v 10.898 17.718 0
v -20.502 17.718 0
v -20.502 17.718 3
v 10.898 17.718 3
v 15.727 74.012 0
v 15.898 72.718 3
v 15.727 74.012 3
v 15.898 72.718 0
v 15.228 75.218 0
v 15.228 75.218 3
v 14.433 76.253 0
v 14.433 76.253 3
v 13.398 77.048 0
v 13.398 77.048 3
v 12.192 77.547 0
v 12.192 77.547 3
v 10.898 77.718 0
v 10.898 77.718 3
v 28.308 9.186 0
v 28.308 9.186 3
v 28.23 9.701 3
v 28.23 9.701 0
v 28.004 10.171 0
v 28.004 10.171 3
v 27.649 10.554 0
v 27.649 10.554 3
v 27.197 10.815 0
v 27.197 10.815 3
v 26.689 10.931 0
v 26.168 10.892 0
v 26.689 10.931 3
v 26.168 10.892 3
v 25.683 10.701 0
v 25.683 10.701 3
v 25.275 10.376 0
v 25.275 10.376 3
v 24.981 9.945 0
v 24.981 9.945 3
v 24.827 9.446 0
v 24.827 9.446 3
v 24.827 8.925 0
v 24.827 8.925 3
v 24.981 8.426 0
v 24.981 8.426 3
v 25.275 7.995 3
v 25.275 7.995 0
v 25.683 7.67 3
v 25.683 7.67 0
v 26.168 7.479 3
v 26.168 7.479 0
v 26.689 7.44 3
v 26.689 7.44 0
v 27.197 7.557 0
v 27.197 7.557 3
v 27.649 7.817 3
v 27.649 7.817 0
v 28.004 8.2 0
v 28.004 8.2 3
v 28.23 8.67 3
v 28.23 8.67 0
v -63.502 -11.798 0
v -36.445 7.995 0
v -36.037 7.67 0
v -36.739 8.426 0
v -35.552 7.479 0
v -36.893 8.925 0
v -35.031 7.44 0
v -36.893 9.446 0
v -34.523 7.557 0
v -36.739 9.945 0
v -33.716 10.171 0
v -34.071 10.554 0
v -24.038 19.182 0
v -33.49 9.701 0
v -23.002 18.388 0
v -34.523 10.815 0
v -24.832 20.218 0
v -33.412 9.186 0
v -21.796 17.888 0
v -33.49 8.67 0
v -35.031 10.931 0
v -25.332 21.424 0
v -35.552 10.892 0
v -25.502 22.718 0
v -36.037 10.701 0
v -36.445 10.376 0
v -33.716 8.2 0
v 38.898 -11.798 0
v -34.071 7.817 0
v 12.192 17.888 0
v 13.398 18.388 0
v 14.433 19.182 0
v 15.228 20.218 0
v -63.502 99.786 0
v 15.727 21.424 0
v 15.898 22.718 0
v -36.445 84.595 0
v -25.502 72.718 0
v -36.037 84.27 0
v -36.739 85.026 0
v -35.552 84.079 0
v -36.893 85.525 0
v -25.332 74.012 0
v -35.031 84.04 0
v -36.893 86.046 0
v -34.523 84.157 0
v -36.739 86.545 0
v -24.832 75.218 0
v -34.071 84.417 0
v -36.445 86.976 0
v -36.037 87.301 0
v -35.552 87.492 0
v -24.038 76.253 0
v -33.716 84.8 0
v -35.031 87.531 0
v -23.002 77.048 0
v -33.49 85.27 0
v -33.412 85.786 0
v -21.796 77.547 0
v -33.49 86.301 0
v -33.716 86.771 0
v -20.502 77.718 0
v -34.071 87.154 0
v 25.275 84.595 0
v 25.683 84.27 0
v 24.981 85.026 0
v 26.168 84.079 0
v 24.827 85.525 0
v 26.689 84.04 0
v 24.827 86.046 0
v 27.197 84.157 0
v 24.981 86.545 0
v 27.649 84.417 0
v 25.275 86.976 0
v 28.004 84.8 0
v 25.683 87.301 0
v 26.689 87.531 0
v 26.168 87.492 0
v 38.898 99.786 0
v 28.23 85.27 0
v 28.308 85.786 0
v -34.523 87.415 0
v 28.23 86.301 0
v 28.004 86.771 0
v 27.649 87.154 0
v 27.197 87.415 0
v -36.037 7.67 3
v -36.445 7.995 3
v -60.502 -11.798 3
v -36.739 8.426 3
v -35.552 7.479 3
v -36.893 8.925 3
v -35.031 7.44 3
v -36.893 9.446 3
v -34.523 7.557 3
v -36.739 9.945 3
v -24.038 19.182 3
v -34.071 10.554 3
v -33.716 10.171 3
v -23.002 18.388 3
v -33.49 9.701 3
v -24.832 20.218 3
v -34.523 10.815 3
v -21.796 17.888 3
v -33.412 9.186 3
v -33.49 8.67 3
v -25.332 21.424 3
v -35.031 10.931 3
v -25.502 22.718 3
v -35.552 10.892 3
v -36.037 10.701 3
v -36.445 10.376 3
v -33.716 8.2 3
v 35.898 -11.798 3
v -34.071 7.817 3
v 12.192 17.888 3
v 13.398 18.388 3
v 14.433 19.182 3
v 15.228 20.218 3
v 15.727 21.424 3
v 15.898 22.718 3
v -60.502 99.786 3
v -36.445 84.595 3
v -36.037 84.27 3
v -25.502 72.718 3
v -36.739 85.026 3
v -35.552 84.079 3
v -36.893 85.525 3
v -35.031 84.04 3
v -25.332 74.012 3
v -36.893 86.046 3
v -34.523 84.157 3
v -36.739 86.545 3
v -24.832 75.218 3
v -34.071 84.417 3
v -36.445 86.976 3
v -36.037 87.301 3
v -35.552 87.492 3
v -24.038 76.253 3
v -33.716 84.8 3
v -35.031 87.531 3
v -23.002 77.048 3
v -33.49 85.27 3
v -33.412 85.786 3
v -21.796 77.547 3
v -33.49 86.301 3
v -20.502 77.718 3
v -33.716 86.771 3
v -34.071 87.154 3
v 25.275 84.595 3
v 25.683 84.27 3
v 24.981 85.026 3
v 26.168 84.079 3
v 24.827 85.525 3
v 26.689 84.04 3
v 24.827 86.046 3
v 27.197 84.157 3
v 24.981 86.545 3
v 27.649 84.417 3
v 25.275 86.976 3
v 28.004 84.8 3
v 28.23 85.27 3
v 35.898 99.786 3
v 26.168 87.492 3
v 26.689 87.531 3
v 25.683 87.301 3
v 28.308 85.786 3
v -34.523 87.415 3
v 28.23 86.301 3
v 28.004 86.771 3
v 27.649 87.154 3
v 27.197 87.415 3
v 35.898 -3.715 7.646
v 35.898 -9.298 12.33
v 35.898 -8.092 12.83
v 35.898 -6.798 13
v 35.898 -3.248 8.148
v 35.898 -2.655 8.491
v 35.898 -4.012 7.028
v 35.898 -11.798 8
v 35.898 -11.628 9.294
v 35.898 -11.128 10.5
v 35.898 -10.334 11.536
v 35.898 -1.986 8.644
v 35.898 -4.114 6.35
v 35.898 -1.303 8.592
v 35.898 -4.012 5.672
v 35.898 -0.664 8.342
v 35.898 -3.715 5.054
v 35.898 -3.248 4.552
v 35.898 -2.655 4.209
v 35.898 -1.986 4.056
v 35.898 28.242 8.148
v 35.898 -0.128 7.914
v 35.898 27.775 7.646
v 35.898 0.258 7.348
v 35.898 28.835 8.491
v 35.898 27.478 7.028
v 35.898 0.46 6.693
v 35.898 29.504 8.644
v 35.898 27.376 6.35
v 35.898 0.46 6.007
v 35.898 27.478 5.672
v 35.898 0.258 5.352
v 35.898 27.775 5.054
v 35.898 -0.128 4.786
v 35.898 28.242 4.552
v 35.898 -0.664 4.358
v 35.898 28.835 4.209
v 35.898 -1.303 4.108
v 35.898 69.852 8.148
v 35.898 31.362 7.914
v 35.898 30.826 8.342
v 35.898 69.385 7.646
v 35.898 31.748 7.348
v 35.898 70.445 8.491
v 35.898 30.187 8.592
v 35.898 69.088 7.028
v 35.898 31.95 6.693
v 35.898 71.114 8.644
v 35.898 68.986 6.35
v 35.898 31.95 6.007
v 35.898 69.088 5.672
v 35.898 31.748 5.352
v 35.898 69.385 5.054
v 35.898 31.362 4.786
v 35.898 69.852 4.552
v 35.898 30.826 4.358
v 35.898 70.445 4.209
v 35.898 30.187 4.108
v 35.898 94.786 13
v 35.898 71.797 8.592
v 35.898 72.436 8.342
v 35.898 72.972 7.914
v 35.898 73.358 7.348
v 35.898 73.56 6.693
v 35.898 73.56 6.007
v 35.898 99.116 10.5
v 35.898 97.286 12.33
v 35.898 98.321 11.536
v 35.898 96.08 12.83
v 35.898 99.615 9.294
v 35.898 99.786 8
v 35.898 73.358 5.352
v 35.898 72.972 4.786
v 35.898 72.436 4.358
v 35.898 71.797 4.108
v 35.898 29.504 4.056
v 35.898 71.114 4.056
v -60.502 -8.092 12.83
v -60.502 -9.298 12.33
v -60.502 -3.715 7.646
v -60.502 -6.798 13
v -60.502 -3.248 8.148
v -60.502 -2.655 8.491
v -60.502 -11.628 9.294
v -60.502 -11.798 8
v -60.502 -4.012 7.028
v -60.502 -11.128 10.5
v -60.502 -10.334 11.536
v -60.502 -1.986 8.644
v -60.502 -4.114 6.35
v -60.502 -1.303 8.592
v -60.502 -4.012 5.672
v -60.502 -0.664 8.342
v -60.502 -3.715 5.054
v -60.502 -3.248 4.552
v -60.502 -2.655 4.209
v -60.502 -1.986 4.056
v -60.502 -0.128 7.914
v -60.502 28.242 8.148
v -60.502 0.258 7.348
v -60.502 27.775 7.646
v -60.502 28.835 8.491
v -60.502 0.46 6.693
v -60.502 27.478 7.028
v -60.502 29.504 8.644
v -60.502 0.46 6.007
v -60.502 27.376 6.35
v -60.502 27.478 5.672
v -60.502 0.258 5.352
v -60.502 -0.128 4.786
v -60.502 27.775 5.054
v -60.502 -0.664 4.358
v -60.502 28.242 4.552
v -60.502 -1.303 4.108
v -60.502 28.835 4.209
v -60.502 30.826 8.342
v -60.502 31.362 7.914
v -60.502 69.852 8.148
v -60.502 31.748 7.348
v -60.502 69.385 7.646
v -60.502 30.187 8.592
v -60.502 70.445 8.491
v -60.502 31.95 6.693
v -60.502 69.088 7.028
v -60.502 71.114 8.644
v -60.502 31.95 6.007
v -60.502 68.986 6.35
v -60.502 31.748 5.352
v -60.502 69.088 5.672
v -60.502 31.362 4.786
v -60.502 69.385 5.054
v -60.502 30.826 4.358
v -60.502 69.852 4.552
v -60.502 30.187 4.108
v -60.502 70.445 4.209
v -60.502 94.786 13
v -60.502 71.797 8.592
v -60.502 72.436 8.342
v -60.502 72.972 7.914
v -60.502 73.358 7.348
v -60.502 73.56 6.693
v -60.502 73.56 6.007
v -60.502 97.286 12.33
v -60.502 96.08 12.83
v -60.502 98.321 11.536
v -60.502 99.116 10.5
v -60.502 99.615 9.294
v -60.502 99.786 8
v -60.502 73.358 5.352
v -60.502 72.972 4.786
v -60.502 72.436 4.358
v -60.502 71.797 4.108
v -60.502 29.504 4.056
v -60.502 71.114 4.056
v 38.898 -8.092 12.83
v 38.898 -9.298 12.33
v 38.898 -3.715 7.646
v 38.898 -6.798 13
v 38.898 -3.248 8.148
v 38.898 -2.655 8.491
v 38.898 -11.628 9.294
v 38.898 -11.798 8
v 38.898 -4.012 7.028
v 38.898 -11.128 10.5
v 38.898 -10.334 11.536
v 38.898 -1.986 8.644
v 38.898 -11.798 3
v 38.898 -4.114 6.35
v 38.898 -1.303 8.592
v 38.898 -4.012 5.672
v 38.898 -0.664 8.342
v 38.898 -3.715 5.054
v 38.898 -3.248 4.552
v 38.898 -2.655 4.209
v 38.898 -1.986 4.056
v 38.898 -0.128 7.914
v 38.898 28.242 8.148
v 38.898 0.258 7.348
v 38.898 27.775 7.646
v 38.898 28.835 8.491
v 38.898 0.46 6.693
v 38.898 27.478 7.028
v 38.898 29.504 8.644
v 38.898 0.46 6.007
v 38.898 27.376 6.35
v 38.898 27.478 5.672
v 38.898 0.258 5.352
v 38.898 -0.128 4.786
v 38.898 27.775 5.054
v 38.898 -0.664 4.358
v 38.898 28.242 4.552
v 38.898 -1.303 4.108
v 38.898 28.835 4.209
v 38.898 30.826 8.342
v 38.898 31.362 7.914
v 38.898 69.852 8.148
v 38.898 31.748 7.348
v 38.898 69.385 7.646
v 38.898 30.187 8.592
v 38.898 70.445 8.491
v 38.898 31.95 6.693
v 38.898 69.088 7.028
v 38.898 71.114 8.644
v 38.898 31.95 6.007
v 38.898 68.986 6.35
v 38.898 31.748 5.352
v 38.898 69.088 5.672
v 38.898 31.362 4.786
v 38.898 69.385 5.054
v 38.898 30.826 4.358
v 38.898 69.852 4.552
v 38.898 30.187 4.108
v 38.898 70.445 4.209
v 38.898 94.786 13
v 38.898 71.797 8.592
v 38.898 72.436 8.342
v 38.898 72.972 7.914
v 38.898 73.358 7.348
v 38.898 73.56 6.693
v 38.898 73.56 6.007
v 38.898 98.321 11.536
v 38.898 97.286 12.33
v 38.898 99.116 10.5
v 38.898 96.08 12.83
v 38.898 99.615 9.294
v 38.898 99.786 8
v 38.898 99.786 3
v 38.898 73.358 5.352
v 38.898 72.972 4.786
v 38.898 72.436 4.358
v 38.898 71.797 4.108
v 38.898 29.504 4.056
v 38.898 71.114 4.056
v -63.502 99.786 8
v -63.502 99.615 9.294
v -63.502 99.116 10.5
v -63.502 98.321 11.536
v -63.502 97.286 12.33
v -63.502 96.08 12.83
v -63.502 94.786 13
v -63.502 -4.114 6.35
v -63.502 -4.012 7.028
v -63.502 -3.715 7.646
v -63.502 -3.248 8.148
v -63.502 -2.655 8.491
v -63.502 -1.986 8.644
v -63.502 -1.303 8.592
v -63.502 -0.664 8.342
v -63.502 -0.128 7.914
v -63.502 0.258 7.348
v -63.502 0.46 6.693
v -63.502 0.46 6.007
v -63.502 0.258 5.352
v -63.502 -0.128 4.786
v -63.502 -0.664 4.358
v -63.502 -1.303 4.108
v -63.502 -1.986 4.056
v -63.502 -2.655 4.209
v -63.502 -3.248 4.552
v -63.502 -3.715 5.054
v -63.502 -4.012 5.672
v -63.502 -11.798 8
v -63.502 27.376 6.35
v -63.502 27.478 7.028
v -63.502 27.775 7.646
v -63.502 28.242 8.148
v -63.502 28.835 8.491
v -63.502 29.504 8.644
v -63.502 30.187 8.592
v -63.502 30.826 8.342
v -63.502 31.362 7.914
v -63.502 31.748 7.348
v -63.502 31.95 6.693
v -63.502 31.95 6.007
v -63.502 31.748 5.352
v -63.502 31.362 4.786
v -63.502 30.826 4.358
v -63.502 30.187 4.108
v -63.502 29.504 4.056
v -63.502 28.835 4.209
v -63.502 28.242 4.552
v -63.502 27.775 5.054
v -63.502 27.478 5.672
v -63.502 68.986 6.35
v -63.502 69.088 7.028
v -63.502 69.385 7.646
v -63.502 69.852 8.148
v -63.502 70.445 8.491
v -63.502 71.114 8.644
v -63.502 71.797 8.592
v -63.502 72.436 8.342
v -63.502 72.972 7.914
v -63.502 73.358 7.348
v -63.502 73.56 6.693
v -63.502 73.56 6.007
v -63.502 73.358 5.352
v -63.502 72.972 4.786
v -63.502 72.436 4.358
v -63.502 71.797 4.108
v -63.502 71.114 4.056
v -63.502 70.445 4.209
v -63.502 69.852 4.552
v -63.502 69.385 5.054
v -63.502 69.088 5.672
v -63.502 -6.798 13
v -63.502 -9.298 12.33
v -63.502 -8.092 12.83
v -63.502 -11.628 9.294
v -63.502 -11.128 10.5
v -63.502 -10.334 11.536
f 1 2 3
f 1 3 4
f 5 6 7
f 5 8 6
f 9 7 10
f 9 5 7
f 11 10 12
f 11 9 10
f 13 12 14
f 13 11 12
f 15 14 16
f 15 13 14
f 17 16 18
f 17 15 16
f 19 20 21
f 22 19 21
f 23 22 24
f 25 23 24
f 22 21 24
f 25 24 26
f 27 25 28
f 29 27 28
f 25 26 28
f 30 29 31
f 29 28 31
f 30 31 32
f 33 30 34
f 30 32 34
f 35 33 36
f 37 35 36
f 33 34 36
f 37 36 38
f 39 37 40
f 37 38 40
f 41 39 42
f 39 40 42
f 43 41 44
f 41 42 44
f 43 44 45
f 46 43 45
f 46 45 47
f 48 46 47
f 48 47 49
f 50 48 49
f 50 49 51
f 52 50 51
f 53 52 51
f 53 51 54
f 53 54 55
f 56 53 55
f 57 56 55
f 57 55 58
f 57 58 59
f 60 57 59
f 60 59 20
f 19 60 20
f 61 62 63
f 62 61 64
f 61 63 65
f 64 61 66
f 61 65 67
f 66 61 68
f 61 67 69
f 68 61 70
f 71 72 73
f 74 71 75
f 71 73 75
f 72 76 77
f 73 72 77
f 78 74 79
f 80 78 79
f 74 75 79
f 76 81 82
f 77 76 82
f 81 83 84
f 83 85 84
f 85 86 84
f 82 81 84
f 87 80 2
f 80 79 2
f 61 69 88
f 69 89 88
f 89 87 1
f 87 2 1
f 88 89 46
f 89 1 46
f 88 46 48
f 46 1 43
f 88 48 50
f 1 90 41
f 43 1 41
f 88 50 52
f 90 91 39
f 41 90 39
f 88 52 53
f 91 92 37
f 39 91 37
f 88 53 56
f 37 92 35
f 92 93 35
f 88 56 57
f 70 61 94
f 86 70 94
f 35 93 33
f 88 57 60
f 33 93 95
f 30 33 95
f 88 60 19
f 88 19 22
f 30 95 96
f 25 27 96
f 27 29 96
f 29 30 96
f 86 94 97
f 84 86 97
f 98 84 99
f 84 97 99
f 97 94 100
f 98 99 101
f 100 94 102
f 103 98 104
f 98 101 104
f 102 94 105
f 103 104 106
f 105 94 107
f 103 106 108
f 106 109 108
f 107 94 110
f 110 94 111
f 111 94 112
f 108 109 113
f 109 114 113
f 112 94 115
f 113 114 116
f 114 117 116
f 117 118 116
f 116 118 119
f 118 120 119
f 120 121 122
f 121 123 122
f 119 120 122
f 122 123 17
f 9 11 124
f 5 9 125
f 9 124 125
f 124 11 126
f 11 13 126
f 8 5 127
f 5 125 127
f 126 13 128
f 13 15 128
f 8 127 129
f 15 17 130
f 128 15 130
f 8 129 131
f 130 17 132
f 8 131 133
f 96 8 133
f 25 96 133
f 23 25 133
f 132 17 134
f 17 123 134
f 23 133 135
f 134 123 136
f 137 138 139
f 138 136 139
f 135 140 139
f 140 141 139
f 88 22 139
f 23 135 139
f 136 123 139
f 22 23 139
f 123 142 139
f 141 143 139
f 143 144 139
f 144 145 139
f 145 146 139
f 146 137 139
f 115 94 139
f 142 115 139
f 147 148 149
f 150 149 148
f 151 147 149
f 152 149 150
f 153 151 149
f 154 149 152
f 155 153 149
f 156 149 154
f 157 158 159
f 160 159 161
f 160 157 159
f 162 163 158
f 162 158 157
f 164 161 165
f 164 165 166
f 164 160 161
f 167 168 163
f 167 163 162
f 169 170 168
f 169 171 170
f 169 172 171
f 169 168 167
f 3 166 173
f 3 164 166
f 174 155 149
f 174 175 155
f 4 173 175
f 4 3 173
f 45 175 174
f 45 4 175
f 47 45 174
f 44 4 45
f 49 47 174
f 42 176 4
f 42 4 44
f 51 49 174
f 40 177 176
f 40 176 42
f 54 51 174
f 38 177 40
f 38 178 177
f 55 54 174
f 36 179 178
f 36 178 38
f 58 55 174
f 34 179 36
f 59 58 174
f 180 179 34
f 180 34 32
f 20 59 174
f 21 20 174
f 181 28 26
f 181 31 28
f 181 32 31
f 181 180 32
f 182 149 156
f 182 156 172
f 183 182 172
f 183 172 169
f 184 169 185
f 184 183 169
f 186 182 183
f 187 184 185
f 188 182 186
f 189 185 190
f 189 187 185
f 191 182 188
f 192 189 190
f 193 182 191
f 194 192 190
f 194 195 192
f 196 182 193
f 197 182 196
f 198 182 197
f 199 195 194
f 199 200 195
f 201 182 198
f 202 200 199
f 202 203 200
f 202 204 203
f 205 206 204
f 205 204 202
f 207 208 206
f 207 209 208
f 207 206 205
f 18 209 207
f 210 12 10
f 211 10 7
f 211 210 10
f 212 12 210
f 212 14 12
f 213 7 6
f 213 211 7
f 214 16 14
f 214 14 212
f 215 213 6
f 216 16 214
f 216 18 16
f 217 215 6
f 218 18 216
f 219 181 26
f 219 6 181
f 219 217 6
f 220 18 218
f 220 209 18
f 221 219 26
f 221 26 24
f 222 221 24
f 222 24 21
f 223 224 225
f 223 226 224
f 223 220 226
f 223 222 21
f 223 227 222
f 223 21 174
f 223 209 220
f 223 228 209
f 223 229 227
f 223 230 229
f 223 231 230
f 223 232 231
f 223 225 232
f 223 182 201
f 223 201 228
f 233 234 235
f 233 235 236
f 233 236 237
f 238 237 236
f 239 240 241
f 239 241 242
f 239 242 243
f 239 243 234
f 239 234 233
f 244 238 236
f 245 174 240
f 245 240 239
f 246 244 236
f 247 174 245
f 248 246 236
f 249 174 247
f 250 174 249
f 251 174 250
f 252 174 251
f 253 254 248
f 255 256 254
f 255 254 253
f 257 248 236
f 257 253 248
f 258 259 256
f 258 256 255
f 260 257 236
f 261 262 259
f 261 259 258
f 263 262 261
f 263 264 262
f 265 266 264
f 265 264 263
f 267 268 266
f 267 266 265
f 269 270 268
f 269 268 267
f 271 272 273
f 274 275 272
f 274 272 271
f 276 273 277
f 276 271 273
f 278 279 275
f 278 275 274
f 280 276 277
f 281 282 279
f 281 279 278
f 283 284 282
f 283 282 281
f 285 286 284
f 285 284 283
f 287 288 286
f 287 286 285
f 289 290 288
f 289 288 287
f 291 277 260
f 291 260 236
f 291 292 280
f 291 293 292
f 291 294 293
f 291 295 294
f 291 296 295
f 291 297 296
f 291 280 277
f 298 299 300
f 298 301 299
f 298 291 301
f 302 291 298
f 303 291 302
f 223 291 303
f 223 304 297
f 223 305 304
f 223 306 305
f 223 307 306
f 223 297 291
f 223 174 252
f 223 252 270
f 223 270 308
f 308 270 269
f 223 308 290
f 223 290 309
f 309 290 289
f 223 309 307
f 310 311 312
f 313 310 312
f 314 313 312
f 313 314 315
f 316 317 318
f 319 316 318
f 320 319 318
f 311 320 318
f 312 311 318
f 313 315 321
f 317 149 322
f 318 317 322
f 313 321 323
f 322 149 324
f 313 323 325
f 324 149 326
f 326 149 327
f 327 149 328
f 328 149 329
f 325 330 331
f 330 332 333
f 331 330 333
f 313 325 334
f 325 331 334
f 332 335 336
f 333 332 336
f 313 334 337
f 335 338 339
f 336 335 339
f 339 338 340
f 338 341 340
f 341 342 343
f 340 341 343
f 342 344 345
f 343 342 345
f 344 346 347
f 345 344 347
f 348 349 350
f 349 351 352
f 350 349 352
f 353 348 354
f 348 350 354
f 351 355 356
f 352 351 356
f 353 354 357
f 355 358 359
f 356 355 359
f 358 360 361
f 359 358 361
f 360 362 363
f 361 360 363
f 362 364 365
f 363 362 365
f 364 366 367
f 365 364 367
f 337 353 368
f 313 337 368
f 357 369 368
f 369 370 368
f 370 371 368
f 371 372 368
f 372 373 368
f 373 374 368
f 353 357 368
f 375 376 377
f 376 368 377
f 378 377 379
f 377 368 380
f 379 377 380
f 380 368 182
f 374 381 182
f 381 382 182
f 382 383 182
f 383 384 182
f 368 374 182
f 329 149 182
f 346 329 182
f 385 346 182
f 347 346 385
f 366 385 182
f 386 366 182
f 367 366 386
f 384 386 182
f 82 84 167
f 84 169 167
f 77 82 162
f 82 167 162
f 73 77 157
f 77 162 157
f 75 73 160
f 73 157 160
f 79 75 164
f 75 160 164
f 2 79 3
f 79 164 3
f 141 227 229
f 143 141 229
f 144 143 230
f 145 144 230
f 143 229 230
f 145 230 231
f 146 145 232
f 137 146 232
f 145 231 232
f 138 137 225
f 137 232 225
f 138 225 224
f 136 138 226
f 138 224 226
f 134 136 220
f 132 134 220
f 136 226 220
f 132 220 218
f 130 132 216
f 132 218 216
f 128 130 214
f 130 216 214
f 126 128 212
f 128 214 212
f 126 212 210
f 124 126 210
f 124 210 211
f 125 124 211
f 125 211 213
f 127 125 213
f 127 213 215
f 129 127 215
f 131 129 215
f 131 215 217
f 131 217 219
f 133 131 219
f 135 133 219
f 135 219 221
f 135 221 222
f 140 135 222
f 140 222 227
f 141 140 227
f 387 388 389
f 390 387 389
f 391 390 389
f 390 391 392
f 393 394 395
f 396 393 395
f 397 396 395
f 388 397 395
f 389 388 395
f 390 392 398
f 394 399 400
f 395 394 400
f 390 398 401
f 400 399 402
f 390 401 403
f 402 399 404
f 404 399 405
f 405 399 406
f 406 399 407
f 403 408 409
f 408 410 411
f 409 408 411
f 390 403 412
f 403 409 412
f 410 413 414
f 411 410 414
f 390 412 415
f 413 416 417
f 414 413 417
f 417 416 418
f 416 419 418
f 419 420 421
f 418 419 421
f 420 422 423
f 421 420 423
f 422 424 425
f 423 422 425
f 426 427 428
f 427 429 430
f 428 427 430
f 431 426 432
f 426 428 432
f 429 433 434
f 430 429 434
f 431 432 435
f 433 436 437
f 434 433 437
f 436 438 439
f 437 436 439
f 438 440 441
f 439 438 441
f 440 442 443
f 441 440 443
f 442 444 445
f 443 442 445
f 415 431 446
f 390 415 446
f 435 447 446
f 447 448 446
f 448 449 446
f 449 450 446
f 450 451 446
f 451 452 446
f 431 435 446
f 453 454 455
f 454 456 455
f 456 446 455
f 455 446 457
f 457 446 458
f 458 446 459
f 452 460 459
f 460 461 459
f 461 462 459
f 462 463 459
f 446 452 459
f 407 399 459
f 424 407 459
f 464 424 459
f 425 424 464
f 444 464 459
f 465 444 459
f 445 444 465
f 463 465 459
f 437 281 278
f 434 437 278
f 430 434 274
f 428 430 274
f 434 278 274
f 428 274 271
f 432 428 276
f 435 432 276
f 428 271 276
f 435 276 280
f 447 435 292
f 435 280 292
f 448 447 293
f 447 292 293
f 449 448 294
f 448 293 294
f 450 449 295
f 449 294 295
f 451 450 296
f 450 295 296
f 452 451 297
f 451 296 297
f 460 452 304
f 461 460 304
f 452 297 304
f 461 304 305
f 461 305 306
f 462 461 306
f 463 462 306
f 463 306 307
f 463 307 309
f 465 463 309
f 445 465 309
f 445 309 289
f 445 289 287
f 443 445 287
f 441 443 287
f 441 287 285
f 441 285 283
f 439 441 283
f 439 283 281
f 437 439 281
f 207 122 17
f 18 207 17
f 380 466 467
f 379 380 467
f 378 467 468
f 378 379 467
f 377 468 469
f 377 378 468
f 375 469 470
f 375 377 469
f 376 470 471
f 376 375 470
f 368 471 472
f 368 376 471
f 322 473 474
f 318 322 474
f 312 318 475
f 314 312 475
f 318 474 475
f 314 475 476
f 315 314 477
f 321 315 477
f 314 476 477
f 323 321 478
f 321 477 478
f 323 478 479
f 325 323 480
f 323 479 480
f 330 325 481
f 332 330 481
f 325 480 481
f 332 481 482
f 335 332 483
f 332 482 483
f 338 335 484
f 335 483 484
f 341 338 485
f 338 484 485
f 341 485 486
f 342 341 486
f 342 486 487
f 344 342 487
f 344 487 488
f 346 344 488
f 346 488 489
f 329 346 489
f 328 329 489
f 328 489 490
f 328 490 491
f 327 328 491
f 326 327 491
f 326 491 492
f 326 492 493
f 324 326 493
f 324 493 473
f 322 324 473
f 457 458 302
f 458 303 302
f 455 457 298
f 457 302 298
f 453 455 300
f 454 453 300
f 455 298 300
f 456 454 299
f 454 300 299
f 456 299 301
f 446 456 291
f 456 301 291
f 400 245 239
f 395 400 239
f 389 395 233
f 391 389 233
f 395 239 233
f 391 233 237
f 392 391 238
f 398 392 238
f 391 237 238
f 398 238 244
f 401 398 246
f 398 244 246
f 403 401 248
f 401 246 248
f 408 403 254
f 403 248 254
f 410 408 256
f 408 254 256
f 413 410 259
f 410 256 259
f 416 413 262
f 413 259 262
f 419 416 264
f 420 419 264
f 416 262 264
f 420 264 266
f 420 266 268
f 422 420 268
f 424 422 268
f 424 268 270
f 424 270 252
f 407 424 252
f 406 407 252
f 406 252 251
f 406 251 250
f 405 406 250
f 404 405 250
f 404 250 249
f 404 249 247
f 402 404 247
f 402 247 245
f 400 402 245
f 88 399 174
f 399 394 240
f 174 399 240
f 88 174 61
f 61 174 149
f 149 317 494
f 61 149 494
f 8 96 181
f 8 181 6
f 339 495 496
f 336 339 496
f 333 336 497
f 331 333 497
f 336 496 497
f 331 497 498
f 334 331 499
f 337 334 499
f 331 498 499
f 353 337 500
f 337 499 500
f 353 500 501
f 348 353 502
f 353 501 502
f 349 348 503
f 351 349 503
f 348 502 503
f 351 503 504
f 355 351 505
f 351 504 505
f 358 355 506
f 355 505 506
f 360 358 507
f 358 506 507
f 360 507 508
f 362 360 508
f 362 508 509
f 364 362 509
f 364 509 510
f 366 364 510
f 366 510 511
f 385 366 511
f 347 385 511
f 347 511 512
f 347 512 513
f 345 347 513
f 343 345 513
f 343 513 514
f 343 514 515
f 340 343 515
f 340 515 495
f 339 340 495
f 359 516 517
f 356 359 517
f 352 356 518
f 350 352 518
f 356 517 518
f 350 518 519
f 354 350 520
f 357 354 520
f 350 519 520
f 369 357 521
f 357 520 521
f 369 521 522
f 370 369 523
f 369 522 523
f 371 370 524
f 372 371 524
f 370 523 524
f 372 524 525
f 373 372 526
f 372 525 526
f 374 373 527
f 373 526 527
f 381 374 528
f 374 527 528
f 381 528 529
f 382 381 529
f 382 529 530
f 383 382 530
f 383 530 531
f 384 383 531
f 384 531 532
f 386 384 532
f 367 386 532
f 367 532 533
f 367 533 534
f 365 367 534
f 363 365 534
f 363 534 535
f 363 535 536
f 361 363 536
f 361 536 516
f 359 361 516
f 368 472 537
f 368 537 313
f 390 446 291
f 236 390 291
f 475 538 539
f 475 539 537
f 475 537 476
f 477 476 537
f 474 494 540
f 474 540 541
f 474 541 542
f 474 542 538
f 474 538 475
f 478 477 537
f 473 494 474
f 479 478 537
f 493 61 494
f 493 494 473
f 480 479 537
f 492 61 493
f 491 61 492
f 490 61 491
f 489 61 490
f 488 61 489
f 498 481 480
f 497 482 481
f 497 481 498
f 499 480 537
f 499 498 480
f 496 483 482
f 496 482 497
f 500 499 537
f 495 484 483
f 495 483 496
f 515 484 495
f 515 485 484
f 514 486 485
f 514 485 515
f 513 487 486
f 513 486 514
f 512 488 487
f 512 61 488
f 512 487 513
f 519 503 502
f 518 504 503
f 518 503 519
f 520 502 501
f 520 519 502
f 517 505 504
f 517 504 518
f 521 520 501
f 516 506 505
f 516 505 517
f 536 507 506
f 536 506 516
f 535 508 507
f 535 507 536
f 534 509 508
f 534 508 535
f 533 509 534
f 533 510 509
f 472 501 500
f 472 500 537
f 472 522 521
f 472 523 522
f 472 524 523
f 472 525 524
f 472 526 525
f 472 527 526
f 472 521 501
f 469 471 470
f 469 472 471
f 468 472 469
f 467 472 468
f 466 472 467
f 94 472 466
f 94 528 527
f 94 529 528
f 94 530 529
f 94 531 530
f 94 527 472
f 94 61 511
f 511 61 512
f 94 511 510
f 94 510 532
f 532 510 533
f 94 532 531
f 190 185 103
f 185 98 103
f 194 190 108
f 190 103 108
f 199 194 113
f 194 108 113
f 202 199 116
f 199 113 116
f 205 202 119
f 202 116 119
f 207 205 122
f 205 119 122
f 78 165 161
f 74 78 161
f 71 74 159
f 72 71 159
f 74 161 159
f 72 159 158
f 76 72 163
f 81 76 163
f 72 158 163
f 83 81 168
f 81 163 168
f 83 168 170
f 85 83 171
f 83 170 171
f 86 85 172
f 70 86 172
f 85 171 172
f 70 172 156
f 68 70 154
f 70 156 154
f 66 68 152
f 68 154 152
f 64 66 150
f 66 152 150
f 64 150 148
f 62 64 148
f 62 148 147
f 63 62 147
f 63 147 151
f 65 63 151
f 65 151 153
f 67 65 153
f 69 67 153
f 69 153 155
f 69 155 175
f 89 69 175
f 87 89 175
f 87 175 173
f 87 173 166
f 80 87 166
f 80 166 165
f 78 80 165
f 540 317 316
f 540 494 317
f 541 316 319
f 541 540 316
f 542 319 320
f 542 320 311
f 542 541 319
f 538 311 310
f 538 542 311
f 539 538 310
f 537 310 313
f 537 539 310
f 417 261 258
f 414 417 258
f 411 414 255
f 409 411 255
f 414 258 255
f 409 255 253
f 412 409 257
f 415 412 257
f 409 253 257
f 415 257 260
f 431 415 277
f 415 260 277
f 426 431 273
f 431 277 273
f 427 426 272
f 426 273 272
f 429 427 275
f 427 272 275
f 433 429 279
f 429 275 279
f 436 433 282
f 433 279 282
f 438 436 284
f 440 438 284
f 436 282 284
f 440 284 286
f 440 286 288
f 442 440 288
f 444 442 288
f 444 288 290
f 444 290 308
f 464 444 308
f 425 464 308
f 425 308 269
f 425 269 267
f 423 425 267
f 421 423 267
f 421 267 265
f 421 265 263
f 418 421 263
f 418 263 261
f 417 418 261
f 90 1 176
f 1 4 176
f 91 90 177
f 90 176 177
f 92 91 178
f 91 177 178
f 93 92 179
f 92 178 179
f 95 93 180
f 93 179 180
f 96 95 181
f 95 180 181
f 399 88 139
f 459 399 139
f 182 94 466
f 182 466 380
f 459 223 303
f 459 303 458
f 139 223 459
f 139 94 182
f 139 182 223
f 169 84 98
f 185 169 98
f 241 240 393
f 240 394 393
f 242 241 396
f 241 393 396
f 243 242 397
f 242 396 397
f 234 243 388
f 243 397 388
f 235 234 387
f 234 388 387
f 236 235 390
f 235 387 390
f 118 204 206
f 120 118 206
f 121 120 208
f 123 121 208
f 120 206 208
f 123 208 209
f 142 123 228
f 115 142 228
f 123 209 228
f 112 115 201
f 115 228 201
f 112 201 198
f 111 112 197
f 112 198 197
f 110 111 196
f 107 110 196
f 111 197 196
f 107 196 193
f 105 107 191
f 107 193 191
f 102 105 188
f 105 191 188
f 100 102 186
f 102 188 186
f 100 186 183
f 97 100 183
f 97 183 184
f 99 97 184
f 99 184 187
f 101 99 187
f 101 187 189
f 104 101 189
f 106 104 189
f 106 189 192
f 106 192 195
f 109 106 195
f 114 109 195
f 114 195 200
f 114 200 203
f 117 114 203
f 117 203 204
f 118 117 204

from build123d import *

# Parameters (mm, degrees)
F0_W      = 102.4
F0_H      = 147
F1_DEPTH  = 3
F2_W      = 3
F2_H      = 147
F3_DEPTH  = 10
F5_R      = 2.3
F6_DEPTH  = 102.401
F7_R      = 1.75
F8_DEPTH  = 3.001
F9_W      = 41.4
F9_H      = 60
F9_W_2    = 96.3999993775
F9_H_2    = 35.4163302109
F10_DEPTH = 12.5
F11_R     = 5


# Not quite as in the source:
# - a pattern or mirror of a feature is missing from the dataset's text; its kind, count and spacing are read off the source's solid
# - a feature names something its author has since deleted; it is built from what else it names


with BuildPart() as f1:
    # F0 (on Top) → F1 (new body)
    with BuildSketch(Plane.XY):
        with Locations((-12.3022546887, 26.2855888009)):
            Rectangle(F0_W, F0_H)
    extrude(amount=F1_DEPTH)

    # F2 (on face) → F3 (join)
    with BuildSketch(Plane.XY.offset(3)):
        with Locations((-62.0022546887, 26.2855888009)):
            Rectangle(F2_W, F2_H)
    f3 = extrude(amount=F3_DEPTH)

    # F3_copies: F3 across plane
    add(f3.mirror(Plane(origin=(-12.302255, 0, 0), x_dir=(0, 0, 1), z_dir=(1, 0, 0))))

    # F5 (on face) → F6 (cut, through all)
    with BuildSketch(Plane(origin=(-63.5022546887, 0, 0), x_dir=(0, -1, 0), z_dir=(-1, 0, 0))):
        with Locations((1.8144111991, 6.35)):
            Circle(F5_R)
        with Locations((-29.6755888009, 6.35)):
            Circle(F5_R)
        with Locations((-71.2855888009, 6.35)):
            Circle(F5_R)
    extrude(amount=-F6_DEPTH, mode=Mode.SUBTRACT)

    # F7 (on face) → F8 (cut, through all)
    with BuildSketch(Plane.XY.offset(3)):
        with Locations((26.5577453113, 9.1855888009)):
            Circle(F7_R)
        with Locations((-35.1622546887, 9.1855888009)):
            Circle(F7_R)
        with Locations((-35.1622546887, 85.7855888009)):
            Circle(F7_R)
        with Locations((26.5577453113, 85.7855888009)):
            Circle(F7_R)
    extrude(amount=-F8_DEPTH, mode=Mode.SUBTRACT)

    # F9 (on face) → F10 (cut, symmetric)
    with BuildSketch(Plane.XY.offset(3)):
        with Locations((-4.8022546887, 47.7176743746)):
            Rectangle(F9_W, F9_H)
        with Locations((-12.302255, -29.5062460937)):
            Rectangle(F9_W_2, F9_H_2)
        Polygon((-71.4376792312, -51.2489080429), (43.8891761005, -51.2489080429), (43.8891761005, -11.7980809882), (35.8977446887, -11.7980809882), (35.8977446887, -47.2144111991), (-60.5022546887, -47.2144111991), (-60.5022546887, -11.7980809882), (-71.4376792312, -11.7980809882), align=None)
    extrude(amount=F10_DEPTH, both=True, mode=Mode.SUBTRACT)

    # F11
    f11_edges = [f1.edges().sort_by_distance(p)[0] for p in [
        (-62.002255, 99.785589, 13),
        (-62.002255, -11.798081, 13),
        (15.897745, 17.717674, 1.5),
        (-25.502255, 17.717674, 1.5),
        (-25.502255, 77.717674, 1.5),
        (15.897745, 77.717674, 1.5),
        (37.397745, 99.785589, 13),
        (37.397745, -11.798081, 13),
    ]]
    fillet(f11_edges, radius=F11_R)


solid = f1.part
